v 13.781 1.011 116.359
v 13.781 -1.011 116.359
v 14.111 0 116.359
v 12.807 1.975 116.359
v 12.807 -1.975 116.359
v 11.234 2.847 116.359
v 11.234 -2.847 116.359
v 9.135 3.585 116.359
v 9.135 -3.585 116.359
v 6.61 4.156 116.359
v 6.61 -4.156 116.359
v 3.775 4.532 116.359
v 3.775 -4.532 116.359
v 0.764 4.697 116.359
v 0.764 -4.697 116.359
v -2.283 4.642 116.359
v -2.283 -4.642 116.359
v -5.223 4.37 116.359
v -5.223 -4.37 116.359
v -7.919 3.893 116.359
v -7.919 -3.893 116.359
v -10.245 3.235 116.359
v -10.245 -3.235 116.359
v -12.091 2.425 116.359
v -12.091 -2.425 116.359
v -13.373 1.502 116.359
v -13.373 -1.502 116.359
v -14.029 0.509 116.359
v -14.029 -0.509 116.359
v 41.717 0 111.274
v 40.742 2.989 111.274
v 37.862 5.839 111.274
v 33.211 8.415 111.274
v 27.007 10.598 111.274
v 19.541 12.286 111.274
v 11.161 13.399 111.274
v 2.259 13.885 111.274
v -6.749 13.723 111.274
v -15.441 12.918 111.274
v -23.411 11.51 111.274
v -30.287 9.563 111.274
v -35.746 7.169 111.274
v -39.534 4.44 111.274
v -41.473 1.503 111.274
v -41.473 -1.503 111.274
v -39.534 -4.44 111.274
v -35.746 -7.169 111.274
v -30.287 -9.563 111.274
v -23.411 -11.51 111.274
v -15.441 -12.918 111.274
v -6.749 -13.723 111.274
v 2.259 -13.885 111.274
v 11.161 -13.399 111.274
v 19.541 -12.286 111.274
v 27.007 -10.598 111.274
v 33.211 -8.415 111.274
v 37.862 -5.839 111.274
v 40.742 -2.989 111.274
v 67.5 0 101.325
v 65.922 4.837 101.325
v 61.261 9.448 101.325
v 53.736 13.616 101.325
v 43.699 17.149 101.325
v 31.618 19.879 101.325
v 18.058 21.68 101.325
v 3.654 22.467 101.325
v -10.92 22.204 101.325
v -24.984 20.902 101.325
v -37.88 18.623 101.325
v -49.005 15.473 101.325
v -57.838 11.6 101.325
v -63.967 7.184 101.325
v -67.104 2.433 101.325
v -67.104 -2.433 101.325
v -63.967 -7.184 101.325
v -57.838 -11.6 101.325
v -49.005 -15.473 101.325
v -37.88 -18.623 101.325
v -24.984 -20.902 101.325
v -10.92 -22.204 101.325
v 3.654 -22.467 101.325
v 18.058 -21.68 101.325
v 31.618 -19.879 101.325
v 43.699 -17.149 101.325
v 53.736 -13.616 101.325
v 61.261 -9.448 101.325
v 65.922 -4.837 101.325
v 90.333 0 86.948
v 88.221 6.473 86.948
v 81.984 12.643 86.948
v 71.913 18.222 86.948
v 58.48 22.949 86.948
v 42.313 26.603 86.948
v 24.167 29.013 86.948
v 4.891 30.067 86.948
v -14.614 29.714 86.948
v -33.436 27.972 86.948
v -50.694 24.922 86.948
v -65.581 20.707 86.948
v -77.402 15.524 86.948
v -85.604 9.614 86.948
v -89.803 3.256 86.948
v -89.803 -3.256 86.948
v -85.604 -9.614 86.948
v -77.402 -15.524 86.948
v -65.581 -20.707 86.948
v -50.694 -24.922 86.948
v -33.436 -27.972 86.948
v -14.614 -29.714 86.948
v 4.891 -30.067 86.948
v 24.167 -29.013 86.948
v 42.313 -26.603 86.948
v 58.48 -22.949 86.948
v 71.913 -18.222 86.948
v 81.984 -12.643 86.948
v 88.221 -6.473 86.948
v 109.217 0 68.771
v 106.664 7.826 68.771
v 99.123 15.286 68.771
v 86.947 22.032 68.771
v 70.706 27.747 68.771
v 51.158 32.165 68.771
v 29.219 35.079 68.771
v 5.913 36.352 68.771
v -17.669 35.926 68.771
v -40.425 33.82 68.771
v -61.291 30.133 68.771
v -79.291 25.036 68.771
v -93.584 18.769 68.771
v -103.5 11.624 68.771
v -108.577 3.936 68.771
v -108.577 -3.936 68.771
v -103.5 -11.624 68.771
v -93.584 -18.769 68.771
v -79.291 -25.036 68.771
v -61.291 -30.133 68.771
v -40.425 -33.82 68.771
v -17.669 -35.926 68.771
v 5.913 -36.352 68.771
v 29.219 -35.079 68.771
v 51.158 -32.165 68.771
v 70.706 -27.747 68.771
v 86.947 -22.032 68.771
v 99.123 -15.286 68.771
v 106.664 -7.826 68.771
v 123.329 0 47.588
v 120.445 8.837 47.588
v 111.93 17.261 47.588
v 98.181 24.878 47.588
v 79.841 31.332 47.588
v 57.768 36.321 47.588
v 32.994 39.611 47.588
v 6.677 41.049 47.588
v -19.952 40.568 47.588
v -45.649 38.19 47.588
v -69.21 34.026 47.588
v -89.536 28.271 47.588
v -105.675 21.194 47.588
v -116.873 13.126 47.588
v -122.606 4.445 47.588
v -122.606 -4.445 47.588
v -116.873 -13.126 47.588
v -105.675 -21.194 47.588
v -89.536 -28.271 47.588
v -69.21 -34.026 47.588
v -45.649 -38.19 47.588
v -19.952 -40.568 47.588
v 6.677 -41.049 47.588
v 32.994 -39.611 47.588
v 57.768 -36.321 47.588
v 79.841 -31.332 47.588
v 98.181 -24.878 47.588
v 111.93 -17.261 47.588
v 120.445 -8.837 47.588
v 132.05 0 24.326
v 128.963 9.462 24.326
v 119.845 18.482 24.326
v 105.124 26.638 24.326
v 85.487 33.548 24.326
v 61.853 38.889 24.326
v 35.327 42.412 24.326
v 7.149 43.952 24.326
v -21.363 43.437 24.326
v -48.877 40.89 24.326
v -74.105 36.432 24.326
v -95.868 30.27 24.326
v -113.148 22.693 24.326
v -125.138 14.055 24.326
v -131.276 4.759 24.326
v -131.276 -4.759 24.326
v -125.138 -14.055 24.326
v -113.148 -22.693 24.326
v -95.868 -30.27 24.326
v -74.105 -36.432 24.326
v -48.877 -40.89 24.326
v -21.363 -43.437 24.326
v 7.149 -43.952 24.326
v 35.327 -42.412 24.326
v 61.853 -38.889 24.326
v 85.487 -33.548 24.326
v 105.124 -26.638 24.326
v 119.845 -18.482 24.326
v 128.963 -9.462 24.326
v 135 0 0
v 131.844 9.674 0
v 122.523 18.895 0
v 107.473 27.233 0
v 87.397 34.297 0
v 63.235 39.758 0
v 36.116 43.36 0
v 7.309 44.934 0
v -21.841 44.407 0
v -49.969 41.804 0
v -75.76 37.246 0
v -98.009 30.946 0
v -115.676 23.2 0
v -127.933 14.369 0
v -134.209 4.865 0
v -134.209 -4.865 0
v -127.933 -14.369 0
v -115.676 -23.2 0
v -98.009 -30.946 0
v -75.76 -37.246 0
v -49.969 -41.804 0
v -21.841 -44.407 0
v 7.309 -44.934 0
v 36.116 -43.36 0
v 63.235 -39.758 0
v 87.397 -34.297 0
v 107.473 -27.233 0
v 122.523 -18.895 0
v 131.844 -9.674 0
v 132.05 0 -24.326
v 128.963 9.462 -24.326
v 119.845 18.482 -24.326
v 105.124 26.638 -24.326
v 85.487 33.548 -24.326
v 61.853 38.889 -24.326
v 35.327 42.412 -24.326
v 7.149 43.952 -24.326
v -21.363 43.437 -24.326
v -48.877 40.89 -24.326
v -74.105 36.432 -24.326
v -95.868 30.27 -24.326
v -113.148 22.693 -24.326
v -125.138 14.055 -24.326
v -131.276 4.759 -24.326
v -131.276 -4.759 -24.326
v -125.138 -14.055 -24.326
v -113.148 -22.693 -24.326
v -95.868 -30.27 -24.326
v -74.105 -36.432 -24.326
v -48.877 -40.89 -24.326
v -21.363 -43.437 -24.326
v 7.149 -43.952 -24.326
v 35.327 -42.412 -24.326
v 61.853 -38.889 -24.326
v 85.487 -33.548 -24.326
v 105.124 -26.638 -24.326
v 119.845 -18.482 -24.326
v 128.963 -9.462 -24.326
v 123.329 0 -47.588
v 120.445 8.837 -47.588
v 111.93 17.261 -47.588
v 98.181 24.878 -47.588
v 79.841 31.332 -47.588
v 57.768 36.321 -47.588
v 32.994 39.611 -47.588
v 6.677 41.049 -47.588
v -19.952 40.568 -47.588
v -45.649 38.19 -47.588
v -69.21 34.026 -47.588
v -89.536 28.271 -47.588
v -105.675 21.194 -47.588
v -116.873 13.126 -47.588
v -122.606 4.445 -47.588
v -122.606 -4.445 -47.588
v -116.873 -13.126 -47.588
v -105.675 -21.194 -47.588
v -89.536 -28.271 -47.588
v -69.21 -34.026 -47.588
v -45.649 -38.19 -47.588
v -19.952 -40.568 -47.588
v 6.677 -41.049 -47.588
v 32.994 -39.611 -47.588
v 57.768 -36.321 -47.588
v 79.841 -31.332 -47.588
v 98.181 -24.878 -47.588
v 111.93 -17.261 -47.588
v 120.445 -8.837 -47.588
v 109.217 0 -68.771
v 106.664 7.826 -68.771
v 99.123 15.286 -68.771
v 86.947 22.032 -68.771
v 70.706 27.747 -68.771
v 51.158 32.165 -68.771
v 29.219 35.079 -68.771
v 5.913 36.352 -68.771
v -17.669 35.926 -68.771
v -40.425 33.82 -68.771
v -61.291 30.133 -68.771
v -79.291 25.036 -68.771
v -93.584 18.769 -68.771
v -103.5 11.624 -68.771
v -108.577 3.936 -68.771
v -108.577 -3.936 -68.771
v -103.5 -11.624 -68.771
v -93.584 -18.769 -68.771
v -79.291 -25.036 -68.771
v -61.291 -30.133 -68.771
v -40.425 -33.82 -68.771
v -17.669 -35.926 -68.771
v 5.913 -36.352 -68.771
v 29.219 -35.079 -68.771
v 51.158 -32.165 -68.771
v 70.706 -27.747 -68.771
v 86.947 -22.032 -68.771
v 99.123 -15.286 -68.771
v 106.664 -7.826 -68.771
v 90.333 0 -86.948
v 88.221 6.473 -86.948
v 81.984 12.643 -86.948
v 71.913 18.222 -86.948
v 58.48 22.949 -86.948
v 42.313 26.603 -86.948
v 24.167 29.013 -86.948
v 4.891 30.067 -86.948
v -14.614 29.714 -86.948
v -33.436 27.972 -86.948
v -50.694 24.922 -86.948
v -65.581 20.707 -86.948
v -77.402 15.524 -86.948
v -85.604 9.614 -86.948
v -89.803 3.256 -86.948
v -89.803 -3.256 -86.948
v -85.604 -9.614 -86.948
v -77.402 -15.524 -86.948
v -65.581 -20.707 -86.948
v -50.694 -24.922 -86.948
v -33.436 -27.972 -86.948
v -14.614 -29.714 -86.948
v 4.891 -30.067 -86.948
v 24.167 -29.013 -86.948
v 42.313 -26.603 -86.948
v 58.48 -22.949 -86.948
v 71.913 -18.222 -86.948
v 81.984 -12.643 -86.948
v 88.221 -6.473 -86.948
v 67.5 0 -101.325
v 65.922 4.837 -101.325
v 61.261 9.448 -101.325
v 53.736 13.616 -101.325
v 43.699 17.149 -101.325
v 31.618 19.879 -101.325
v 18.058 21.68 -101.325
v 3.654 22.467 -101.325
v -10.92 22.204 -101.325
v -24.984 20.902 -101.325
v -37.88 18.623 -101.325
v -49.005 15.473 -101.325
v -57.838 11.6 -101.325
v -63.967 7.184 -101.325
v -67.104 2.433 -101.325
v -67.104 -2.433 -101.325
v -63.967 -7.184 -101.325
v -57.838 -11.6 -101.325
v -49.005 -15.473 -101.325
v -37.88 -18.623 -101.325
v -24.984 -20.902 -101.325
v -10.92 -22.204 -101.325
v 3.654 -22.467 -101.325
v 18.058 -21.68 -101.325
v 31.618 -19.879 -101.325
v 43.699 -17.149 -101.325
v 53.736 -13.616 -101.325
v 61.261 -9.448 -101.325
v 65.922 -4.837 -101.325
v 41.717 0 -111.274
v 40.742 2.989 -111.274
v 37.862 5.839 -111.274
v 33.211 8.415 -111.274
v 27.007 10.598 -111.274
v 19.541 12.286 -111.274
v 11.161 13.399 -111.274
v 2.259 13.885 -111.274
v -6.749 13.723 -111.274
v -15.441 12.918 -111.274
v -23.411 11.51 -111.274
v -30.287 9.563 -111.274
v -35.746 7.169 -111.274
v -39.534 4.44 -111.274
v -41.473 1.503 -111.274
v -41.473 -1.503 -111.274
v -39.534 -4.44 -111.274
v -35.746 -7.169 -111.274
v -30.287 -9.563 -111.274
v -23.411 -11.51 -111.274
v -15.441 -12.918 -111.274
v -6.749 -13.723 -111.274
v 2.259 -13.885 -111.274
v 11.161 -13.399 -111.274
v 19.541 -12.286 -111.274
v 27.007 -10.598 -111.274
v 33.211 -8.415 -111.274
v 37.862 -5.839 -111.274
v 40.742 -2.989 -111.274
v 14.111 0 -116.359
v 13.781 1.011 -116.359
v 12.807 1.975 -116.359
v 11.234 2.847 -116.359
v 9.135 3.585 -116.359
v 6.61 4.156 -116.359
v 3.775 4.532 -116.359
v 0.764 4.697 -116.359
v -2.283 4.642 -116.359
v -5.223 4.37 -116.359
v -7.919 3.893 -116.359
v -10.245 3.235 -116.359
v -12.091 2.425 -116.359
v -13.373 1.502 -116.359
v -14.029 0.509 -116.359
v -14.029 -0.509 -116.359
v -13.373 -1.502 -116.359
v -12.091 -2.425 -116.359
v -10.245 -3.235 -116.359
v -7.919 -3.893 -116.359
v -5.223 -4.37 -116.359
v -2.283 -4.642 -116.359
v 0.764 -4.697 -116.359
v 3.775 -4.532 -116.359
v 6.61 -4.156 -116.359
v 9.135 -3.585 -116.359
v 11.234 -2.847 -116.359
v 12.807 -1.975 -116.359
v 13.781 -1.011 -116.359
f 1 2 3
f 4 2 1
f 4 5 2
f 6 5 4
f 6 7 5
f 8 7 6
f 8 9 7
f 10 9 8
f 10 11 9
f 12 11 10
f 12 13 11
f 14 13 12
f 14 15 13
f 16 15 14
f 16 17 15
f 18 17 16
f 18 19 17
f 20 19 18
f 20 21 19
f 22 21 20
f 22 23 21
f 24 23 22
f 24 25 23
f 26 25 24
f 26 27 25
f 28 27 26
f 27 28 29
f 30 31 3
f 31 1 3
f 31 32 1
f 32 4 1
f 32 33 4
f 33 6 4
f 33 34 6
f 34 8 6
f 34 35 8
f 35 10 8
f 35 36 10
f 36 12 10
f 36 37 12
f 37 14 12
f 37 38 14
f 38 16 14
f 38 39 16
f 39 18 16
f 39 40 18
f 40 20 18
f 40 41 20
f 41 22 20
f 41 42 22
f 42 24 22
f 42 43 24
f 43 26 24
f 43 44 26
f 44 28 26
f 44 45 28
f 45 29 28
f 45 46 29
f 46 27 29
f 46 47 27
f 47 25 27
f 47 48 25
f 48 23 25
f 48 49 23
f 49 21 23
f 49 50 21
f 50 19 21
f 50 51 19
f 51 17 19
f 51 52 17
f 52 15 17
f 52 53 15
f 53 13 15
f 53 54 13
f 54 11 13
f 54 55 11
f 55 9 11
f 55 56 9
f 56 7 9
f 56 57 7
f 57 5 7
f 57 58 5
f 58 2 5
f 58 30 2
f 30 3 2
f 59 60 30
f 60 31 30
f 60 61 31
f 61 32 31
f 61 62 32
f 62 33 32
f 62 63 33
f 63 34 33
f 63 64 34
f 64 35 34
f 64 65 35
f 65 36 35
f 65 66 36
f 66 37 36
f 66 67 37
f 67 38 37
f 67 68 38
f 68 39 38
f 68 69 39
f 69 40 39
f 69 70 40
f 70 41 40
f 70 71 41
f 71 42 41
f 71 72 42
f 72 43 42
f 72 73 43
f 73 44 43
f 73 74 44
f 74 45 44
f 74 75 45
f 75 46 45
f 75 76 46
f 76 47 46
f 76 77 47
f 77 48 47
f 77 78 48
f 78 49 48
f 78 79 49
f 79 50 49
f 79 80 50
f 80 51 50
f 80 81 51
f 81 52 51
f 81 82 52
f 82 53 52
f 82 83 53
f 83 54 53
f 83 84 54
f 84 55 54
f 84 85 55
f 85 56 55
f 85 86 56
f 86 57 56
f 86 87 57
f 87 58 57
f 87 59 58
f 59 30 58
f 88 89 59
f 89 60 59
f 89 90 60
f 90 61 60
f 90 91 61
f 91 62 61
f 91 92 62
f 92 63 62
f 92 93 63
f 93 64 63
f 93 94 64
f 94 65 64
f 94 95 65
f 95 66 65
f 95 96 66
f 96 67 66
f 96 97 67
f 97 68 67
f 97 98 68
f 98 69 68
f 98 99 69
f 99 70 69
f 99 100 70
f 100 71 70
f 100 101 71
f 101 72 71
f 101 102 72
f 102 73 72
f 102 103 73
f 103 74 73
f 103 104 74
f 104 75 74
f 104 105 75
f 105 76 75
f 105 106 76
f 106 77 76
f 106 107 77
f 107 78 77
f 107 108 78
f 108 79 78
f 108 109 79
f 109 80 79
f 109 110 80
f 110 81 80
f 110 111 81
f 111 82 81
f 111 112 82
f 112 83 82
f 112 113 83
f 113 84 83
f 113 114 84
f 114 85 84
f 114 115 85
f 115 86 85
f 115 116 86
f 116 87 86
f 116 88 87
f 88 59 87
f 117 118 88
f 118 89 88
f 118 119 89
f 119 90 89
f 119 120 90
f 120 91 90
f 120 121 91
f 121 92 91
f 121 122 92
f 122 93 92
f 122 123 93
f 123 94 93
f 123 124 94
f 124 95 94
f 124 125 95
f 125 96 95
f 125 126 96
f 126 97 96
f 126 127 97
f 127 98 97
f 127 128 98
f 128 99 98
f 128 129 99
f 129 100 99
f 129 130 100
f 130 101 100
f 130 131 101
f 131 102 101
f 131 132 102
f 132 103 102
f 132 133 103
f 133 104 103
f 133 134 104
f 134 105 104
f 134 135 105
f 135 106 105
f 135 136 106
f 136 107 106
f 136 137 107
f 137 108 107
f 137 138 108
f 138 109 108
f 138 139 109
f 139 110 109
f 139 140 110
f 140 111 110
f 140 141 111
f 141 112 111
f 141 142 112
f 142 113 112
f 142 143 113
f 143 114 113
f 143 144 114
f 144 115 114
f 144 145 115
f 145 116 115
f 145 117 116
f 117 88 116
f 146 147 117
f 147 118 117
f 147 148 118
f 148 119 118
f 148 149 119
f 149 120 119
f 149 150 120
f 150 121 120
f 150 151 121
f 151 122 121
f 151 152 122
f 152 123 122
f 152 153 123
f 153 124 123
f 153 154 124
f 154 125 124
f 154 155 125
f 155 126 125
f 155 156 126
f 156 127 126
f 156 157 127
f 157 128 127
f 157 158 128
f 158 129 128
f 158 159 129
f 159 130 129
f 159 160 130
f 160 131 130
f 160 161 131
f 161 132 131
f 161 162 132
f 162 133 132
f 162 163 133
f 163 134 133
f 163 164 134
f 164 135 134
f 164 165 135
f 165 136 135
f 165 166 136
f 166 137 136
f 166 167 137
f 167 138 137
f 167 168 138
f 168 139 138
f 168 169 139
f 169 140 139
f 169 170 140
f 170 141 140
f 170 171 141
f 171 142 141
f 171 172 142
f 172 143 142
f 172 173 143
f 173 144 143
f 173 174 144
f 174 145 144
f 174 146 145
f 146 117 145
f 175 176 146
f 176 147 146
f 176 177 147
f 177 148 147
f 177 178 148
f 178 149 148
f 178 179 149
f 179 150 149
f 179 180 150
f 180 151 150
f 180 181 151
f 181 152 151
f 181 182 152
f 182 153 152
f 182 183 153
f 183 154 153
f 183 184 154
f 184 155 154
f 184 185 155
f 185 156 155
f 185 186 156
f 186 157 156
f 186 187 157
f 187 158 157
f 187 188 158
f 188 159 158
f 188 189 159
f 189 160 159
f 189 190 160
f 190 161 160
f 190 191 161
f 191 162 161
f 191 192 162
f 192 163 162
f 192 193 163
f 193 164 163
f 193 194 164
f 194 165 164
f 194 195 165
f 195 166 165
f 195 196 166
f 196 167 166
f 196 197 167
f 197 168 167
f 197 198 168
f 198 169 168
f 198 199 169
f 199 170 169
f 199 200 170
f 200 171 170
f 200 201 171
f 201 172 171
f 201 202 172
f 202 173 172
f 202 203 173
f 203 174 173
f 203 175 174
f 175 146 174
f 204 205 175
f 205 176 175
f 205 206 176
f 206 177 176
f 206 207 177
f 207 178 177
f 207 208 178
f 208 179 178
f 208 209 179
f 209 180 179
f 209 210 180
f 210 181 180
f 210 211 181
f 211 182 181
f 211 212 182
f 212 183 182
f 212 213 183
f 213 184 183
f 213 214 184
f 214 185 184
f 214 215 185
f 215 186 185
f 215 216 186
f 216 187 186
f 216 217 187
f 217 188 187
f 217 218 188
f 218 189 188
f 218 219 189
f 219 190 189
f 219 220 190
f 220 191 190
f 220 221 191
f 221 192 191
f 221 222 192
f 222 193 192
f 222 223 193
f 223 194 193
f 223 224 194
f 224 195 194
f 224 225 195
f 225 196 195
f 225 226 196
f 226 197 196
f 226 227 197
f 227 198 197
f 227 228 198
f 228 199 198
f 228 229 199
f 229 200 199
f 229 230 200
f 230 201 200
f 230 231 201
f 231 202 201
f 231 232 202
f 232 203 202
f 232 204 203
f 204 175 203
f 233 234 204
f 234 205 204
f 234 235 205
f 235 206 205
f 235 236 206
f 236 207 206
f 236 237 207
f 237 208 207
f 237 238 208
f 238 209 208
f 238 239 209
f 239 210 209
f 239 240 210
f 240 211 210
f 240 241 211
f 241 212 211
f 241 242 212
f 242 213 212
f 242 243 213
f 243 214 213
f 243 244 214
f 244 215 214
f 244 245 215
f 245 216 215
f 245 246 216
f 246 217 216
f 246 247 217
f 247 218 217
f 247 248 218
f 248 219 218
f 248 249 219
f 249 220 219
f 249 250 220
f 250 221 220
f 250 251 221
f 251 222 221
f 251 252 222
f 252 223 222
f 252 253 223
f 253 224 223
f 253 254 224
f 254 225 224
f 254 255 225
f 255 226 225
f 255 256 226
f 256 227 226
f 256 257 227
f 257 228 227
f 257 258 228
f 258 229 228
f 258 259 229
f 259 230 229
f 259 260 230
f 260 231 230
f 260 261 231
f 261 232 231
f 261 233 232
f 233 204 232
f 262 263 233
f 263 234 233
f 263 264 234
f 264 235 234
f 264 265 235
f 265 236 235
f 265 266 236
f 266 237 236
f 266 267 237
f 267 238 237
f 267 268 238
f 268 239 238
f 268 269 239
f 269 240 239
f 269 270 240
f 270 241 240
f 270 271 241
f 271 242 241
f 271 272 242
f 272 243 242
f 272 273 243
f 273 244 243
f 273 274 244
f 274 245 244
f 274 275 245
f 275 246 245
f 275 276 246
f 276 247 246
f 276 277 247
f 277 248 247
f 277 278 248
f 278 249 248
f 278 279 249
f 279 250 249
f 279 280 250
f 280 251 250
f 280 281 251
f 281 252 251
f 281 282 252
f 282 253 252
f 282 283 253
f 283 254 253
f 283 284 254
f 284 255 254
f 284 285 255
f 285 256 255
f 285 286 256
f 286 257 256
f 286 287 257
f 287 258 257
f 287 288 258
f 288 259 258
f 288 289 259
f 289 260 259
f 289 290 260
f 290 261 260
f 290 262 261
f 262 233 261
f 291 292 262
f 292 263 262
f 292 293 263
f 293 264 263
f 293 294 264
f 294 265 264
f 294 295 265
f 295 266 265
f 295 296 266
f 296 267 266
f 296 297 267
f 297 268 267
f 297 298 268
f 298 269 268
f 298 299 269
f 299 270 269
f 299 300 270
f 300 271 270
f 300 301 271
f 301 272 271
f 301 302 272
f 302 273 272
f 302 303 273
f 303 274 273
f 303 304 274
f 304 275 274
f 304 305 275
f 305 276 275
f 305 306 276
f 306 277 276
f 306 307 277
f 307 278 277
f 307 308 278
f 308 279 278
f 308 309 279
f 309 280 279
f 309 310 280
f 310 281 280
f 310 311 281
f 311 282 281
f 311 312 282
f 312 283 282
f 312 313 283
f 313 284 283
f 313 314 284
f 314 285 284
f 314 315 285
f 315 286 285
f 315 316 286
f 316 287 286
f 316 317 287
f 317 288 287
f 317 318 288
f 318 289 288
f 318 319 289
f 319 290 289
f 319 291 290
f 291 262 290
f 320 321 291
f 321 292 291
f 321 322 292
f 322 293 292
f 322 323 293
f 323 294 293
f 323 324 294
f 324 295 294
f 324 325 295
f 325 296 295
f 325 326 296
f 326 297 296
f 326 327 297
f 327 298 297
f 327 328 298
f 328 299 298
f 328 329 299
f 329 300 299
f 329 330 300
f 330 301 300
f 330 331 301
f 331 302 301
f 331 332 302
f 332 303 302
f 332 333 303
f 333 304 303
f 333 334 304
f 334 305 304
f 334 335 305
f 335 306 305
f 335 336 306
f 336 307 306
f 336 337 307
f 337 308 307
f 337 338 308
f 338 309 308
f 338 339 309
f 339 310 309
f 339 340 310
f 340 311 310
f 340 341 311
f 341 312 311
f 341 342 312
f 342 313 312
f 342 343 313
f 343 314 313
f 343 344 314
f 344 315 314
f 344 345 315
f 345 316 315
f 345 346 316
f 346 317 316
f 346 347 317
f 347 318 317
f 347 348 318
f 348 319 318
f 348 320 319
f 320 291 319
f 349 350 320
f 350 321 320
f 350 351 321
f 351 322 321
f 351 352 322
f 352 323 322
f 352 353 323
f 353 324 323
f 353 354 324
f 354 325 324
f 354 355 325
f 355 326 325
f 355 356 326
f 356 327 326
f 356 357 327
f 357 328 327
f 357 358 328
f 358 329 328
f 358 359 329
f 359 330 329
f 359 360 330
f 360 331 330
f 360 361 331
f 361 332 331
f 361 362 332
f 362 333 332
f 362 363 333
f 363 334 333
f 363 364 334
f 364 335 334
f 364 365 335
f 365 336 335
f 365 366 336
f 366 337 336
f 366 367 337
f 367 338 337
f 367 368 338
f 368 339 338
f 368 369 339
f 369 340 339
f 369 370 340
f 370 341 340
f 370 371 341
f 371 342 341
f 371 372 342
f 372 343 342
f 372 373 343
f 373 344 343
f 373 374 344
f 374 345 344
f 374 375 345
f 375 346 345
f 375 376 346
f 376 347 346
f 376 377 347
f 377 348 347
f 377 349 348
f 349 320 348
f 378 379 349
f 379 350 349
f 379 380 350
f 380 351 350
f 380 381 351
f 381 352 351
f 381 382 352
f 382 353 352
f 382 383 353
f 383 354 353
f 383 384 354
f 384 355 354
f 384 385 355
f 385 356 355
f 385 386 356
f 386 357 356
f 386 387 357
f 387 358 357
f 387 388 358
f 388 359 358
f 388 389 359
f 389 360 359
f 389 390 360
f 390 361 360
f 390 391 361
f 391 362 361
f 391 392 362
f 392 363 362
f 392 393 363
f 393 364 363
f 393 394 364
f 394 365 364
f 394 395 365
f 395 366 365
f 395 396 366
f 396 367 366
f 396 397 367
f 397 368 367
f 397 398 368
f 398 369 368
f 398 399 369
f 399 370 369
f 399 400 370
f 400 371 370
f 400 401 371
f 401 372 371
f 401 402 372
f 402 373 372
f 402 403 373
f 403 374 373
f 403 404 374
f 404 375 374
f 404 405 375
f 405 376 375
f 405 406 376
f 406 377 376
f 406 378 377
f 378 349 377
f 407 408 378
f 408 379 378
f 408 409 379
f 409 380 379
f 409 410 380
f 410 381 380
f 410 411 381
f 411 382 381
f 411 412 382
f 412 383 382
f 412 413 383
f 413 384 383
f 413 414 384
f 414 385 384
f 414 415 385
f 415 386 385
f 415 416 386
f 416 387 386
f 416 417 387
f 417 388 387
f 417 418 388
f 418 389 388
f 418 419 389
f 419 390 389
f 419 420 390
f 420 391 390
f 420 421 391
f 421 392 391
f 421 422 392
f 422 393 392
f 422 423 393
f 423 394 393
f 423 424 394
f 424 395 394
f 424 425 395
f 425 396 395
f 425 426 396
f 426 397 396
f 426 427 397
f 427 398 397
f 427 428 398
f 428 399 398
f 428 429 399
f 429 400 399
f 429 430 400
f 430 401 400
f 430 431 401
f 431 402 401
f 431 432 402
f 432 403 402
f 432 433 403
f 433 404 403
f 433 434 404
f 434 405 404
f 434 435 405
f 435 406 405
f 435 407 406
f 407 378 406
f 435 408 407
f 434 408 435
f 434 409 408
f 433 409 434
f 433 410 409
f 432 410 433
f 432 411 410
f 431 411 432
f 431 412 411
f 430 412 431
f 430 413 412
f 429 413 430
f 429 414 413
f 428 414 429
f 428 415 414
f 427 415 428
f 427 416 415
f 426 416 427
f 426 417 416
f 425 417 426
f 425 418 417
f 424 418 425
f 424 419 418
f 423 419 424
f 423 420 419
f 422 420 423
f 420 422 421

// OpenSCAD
// Generated by SolidPython 1.0.1 on 2020-07-29 00:46:51


scale(v = [15, 5, 13]) {
	sphere(r = 9);
}
/***********************************************
*********      SolidPython code:      **********
************************************************
 
# import packages: SolidPython
from solid import *
from solid.utils import *
from itertools import chain, combinations, permutations


class Resize:

    def __init__(self, scad_file):
        self.scad_file = scad_file
        #self.scad_file = import_scad(scad_file)
        # cone/cylinder param:
        self.r1 = 0
        self.r2 = 0
        self.h = 0
        # rectangular prism param:
        self.w = 0
        self.l = 0
        # ellipse param:
        self.r = 0

    # import OpenScad code (file name corresponds to shape)


    # classify shape + parameters
    def assign(self, param1, param2, param3):
        if self.scad_file == 'cone.scad':
            self.r1 = param1
            self.r2 = param2
            self.h = param3
        elif self.scad_file == 'cylinder.scad':
            self.r1 = param1
            self.r2 = param2
            self.h = param3
        elif self.scad_file == 'rectangularPrism.scad':
            self.h = param1
            self.l = param2
            self.w = param3
        else:
            self.r = param1
            self.h = param2

    # resize parameters
    def iterate(self):
        x = range(3, 20, 2)
        i = 1
        if self.scad_file == 'cone.scad':
            tempList = list(permutations(x, 2))
            for temp in tempList:
                param1 = temp[0]
                param2 = temp[1]
                filepath = 'produced_scad_files/' + 'cone' + str(param1) + '_' + str(param2) + '_' + '.scad'
                scad_render_to_file(cylinder(h=param1, r1=param2, r2=0), filepath)

        elif self.scad_file == 'cylinder.scad':
            tempList = list(permutations(x, 3))
            for temp in tempList:
                param1 = temp[0]
                param2 = temp[1]
                filepath = 'produced_scad_files/' + 'cylinder' + str(param1) + '_' + str(param2) + '_' + '.scad'
                scad_render_to_file(cylinder(h=param1, r1=param2, r2=param2), filepath)

        elif self.scad_file == 'rectangularPrism.scad':
            tempList = list(permutations(x, 3))
            for temp in tempList:
                param1 = temp[0]
                param2 = temp[1]
                param3 = temp[2]
                filepath = 'produced_scad_files/' + 'rectangularPrism' + str(param1) + '_' + str(param2) + '_' + str(
                    param3) + '.scad'
                scad_render_to_file(cube(size=(param1, param2, param3)), filepath)

        elif self.scad_file == 'ellipse.scad':
            tempList = list(permutations(x, 4))
            for temp in tempList:
                param1 = temp[0]
                param2 = temp[1]
                param3 = temp[2]
                param4 = temp[3]
                filepath = 'produced_scad_files/' + 'ellipse' + str(param1) + '_' + str(param2) + '_' + str(param3) + '_' + str(param4) + '.scad'
                scad_render_to_file(scale([param1, param2, param3])(sphere(r=param4)), filepath)

    def render_to_scadfile(self):
        scad_render_to_file(scad, 'example.scad') 
 
************************************************/
